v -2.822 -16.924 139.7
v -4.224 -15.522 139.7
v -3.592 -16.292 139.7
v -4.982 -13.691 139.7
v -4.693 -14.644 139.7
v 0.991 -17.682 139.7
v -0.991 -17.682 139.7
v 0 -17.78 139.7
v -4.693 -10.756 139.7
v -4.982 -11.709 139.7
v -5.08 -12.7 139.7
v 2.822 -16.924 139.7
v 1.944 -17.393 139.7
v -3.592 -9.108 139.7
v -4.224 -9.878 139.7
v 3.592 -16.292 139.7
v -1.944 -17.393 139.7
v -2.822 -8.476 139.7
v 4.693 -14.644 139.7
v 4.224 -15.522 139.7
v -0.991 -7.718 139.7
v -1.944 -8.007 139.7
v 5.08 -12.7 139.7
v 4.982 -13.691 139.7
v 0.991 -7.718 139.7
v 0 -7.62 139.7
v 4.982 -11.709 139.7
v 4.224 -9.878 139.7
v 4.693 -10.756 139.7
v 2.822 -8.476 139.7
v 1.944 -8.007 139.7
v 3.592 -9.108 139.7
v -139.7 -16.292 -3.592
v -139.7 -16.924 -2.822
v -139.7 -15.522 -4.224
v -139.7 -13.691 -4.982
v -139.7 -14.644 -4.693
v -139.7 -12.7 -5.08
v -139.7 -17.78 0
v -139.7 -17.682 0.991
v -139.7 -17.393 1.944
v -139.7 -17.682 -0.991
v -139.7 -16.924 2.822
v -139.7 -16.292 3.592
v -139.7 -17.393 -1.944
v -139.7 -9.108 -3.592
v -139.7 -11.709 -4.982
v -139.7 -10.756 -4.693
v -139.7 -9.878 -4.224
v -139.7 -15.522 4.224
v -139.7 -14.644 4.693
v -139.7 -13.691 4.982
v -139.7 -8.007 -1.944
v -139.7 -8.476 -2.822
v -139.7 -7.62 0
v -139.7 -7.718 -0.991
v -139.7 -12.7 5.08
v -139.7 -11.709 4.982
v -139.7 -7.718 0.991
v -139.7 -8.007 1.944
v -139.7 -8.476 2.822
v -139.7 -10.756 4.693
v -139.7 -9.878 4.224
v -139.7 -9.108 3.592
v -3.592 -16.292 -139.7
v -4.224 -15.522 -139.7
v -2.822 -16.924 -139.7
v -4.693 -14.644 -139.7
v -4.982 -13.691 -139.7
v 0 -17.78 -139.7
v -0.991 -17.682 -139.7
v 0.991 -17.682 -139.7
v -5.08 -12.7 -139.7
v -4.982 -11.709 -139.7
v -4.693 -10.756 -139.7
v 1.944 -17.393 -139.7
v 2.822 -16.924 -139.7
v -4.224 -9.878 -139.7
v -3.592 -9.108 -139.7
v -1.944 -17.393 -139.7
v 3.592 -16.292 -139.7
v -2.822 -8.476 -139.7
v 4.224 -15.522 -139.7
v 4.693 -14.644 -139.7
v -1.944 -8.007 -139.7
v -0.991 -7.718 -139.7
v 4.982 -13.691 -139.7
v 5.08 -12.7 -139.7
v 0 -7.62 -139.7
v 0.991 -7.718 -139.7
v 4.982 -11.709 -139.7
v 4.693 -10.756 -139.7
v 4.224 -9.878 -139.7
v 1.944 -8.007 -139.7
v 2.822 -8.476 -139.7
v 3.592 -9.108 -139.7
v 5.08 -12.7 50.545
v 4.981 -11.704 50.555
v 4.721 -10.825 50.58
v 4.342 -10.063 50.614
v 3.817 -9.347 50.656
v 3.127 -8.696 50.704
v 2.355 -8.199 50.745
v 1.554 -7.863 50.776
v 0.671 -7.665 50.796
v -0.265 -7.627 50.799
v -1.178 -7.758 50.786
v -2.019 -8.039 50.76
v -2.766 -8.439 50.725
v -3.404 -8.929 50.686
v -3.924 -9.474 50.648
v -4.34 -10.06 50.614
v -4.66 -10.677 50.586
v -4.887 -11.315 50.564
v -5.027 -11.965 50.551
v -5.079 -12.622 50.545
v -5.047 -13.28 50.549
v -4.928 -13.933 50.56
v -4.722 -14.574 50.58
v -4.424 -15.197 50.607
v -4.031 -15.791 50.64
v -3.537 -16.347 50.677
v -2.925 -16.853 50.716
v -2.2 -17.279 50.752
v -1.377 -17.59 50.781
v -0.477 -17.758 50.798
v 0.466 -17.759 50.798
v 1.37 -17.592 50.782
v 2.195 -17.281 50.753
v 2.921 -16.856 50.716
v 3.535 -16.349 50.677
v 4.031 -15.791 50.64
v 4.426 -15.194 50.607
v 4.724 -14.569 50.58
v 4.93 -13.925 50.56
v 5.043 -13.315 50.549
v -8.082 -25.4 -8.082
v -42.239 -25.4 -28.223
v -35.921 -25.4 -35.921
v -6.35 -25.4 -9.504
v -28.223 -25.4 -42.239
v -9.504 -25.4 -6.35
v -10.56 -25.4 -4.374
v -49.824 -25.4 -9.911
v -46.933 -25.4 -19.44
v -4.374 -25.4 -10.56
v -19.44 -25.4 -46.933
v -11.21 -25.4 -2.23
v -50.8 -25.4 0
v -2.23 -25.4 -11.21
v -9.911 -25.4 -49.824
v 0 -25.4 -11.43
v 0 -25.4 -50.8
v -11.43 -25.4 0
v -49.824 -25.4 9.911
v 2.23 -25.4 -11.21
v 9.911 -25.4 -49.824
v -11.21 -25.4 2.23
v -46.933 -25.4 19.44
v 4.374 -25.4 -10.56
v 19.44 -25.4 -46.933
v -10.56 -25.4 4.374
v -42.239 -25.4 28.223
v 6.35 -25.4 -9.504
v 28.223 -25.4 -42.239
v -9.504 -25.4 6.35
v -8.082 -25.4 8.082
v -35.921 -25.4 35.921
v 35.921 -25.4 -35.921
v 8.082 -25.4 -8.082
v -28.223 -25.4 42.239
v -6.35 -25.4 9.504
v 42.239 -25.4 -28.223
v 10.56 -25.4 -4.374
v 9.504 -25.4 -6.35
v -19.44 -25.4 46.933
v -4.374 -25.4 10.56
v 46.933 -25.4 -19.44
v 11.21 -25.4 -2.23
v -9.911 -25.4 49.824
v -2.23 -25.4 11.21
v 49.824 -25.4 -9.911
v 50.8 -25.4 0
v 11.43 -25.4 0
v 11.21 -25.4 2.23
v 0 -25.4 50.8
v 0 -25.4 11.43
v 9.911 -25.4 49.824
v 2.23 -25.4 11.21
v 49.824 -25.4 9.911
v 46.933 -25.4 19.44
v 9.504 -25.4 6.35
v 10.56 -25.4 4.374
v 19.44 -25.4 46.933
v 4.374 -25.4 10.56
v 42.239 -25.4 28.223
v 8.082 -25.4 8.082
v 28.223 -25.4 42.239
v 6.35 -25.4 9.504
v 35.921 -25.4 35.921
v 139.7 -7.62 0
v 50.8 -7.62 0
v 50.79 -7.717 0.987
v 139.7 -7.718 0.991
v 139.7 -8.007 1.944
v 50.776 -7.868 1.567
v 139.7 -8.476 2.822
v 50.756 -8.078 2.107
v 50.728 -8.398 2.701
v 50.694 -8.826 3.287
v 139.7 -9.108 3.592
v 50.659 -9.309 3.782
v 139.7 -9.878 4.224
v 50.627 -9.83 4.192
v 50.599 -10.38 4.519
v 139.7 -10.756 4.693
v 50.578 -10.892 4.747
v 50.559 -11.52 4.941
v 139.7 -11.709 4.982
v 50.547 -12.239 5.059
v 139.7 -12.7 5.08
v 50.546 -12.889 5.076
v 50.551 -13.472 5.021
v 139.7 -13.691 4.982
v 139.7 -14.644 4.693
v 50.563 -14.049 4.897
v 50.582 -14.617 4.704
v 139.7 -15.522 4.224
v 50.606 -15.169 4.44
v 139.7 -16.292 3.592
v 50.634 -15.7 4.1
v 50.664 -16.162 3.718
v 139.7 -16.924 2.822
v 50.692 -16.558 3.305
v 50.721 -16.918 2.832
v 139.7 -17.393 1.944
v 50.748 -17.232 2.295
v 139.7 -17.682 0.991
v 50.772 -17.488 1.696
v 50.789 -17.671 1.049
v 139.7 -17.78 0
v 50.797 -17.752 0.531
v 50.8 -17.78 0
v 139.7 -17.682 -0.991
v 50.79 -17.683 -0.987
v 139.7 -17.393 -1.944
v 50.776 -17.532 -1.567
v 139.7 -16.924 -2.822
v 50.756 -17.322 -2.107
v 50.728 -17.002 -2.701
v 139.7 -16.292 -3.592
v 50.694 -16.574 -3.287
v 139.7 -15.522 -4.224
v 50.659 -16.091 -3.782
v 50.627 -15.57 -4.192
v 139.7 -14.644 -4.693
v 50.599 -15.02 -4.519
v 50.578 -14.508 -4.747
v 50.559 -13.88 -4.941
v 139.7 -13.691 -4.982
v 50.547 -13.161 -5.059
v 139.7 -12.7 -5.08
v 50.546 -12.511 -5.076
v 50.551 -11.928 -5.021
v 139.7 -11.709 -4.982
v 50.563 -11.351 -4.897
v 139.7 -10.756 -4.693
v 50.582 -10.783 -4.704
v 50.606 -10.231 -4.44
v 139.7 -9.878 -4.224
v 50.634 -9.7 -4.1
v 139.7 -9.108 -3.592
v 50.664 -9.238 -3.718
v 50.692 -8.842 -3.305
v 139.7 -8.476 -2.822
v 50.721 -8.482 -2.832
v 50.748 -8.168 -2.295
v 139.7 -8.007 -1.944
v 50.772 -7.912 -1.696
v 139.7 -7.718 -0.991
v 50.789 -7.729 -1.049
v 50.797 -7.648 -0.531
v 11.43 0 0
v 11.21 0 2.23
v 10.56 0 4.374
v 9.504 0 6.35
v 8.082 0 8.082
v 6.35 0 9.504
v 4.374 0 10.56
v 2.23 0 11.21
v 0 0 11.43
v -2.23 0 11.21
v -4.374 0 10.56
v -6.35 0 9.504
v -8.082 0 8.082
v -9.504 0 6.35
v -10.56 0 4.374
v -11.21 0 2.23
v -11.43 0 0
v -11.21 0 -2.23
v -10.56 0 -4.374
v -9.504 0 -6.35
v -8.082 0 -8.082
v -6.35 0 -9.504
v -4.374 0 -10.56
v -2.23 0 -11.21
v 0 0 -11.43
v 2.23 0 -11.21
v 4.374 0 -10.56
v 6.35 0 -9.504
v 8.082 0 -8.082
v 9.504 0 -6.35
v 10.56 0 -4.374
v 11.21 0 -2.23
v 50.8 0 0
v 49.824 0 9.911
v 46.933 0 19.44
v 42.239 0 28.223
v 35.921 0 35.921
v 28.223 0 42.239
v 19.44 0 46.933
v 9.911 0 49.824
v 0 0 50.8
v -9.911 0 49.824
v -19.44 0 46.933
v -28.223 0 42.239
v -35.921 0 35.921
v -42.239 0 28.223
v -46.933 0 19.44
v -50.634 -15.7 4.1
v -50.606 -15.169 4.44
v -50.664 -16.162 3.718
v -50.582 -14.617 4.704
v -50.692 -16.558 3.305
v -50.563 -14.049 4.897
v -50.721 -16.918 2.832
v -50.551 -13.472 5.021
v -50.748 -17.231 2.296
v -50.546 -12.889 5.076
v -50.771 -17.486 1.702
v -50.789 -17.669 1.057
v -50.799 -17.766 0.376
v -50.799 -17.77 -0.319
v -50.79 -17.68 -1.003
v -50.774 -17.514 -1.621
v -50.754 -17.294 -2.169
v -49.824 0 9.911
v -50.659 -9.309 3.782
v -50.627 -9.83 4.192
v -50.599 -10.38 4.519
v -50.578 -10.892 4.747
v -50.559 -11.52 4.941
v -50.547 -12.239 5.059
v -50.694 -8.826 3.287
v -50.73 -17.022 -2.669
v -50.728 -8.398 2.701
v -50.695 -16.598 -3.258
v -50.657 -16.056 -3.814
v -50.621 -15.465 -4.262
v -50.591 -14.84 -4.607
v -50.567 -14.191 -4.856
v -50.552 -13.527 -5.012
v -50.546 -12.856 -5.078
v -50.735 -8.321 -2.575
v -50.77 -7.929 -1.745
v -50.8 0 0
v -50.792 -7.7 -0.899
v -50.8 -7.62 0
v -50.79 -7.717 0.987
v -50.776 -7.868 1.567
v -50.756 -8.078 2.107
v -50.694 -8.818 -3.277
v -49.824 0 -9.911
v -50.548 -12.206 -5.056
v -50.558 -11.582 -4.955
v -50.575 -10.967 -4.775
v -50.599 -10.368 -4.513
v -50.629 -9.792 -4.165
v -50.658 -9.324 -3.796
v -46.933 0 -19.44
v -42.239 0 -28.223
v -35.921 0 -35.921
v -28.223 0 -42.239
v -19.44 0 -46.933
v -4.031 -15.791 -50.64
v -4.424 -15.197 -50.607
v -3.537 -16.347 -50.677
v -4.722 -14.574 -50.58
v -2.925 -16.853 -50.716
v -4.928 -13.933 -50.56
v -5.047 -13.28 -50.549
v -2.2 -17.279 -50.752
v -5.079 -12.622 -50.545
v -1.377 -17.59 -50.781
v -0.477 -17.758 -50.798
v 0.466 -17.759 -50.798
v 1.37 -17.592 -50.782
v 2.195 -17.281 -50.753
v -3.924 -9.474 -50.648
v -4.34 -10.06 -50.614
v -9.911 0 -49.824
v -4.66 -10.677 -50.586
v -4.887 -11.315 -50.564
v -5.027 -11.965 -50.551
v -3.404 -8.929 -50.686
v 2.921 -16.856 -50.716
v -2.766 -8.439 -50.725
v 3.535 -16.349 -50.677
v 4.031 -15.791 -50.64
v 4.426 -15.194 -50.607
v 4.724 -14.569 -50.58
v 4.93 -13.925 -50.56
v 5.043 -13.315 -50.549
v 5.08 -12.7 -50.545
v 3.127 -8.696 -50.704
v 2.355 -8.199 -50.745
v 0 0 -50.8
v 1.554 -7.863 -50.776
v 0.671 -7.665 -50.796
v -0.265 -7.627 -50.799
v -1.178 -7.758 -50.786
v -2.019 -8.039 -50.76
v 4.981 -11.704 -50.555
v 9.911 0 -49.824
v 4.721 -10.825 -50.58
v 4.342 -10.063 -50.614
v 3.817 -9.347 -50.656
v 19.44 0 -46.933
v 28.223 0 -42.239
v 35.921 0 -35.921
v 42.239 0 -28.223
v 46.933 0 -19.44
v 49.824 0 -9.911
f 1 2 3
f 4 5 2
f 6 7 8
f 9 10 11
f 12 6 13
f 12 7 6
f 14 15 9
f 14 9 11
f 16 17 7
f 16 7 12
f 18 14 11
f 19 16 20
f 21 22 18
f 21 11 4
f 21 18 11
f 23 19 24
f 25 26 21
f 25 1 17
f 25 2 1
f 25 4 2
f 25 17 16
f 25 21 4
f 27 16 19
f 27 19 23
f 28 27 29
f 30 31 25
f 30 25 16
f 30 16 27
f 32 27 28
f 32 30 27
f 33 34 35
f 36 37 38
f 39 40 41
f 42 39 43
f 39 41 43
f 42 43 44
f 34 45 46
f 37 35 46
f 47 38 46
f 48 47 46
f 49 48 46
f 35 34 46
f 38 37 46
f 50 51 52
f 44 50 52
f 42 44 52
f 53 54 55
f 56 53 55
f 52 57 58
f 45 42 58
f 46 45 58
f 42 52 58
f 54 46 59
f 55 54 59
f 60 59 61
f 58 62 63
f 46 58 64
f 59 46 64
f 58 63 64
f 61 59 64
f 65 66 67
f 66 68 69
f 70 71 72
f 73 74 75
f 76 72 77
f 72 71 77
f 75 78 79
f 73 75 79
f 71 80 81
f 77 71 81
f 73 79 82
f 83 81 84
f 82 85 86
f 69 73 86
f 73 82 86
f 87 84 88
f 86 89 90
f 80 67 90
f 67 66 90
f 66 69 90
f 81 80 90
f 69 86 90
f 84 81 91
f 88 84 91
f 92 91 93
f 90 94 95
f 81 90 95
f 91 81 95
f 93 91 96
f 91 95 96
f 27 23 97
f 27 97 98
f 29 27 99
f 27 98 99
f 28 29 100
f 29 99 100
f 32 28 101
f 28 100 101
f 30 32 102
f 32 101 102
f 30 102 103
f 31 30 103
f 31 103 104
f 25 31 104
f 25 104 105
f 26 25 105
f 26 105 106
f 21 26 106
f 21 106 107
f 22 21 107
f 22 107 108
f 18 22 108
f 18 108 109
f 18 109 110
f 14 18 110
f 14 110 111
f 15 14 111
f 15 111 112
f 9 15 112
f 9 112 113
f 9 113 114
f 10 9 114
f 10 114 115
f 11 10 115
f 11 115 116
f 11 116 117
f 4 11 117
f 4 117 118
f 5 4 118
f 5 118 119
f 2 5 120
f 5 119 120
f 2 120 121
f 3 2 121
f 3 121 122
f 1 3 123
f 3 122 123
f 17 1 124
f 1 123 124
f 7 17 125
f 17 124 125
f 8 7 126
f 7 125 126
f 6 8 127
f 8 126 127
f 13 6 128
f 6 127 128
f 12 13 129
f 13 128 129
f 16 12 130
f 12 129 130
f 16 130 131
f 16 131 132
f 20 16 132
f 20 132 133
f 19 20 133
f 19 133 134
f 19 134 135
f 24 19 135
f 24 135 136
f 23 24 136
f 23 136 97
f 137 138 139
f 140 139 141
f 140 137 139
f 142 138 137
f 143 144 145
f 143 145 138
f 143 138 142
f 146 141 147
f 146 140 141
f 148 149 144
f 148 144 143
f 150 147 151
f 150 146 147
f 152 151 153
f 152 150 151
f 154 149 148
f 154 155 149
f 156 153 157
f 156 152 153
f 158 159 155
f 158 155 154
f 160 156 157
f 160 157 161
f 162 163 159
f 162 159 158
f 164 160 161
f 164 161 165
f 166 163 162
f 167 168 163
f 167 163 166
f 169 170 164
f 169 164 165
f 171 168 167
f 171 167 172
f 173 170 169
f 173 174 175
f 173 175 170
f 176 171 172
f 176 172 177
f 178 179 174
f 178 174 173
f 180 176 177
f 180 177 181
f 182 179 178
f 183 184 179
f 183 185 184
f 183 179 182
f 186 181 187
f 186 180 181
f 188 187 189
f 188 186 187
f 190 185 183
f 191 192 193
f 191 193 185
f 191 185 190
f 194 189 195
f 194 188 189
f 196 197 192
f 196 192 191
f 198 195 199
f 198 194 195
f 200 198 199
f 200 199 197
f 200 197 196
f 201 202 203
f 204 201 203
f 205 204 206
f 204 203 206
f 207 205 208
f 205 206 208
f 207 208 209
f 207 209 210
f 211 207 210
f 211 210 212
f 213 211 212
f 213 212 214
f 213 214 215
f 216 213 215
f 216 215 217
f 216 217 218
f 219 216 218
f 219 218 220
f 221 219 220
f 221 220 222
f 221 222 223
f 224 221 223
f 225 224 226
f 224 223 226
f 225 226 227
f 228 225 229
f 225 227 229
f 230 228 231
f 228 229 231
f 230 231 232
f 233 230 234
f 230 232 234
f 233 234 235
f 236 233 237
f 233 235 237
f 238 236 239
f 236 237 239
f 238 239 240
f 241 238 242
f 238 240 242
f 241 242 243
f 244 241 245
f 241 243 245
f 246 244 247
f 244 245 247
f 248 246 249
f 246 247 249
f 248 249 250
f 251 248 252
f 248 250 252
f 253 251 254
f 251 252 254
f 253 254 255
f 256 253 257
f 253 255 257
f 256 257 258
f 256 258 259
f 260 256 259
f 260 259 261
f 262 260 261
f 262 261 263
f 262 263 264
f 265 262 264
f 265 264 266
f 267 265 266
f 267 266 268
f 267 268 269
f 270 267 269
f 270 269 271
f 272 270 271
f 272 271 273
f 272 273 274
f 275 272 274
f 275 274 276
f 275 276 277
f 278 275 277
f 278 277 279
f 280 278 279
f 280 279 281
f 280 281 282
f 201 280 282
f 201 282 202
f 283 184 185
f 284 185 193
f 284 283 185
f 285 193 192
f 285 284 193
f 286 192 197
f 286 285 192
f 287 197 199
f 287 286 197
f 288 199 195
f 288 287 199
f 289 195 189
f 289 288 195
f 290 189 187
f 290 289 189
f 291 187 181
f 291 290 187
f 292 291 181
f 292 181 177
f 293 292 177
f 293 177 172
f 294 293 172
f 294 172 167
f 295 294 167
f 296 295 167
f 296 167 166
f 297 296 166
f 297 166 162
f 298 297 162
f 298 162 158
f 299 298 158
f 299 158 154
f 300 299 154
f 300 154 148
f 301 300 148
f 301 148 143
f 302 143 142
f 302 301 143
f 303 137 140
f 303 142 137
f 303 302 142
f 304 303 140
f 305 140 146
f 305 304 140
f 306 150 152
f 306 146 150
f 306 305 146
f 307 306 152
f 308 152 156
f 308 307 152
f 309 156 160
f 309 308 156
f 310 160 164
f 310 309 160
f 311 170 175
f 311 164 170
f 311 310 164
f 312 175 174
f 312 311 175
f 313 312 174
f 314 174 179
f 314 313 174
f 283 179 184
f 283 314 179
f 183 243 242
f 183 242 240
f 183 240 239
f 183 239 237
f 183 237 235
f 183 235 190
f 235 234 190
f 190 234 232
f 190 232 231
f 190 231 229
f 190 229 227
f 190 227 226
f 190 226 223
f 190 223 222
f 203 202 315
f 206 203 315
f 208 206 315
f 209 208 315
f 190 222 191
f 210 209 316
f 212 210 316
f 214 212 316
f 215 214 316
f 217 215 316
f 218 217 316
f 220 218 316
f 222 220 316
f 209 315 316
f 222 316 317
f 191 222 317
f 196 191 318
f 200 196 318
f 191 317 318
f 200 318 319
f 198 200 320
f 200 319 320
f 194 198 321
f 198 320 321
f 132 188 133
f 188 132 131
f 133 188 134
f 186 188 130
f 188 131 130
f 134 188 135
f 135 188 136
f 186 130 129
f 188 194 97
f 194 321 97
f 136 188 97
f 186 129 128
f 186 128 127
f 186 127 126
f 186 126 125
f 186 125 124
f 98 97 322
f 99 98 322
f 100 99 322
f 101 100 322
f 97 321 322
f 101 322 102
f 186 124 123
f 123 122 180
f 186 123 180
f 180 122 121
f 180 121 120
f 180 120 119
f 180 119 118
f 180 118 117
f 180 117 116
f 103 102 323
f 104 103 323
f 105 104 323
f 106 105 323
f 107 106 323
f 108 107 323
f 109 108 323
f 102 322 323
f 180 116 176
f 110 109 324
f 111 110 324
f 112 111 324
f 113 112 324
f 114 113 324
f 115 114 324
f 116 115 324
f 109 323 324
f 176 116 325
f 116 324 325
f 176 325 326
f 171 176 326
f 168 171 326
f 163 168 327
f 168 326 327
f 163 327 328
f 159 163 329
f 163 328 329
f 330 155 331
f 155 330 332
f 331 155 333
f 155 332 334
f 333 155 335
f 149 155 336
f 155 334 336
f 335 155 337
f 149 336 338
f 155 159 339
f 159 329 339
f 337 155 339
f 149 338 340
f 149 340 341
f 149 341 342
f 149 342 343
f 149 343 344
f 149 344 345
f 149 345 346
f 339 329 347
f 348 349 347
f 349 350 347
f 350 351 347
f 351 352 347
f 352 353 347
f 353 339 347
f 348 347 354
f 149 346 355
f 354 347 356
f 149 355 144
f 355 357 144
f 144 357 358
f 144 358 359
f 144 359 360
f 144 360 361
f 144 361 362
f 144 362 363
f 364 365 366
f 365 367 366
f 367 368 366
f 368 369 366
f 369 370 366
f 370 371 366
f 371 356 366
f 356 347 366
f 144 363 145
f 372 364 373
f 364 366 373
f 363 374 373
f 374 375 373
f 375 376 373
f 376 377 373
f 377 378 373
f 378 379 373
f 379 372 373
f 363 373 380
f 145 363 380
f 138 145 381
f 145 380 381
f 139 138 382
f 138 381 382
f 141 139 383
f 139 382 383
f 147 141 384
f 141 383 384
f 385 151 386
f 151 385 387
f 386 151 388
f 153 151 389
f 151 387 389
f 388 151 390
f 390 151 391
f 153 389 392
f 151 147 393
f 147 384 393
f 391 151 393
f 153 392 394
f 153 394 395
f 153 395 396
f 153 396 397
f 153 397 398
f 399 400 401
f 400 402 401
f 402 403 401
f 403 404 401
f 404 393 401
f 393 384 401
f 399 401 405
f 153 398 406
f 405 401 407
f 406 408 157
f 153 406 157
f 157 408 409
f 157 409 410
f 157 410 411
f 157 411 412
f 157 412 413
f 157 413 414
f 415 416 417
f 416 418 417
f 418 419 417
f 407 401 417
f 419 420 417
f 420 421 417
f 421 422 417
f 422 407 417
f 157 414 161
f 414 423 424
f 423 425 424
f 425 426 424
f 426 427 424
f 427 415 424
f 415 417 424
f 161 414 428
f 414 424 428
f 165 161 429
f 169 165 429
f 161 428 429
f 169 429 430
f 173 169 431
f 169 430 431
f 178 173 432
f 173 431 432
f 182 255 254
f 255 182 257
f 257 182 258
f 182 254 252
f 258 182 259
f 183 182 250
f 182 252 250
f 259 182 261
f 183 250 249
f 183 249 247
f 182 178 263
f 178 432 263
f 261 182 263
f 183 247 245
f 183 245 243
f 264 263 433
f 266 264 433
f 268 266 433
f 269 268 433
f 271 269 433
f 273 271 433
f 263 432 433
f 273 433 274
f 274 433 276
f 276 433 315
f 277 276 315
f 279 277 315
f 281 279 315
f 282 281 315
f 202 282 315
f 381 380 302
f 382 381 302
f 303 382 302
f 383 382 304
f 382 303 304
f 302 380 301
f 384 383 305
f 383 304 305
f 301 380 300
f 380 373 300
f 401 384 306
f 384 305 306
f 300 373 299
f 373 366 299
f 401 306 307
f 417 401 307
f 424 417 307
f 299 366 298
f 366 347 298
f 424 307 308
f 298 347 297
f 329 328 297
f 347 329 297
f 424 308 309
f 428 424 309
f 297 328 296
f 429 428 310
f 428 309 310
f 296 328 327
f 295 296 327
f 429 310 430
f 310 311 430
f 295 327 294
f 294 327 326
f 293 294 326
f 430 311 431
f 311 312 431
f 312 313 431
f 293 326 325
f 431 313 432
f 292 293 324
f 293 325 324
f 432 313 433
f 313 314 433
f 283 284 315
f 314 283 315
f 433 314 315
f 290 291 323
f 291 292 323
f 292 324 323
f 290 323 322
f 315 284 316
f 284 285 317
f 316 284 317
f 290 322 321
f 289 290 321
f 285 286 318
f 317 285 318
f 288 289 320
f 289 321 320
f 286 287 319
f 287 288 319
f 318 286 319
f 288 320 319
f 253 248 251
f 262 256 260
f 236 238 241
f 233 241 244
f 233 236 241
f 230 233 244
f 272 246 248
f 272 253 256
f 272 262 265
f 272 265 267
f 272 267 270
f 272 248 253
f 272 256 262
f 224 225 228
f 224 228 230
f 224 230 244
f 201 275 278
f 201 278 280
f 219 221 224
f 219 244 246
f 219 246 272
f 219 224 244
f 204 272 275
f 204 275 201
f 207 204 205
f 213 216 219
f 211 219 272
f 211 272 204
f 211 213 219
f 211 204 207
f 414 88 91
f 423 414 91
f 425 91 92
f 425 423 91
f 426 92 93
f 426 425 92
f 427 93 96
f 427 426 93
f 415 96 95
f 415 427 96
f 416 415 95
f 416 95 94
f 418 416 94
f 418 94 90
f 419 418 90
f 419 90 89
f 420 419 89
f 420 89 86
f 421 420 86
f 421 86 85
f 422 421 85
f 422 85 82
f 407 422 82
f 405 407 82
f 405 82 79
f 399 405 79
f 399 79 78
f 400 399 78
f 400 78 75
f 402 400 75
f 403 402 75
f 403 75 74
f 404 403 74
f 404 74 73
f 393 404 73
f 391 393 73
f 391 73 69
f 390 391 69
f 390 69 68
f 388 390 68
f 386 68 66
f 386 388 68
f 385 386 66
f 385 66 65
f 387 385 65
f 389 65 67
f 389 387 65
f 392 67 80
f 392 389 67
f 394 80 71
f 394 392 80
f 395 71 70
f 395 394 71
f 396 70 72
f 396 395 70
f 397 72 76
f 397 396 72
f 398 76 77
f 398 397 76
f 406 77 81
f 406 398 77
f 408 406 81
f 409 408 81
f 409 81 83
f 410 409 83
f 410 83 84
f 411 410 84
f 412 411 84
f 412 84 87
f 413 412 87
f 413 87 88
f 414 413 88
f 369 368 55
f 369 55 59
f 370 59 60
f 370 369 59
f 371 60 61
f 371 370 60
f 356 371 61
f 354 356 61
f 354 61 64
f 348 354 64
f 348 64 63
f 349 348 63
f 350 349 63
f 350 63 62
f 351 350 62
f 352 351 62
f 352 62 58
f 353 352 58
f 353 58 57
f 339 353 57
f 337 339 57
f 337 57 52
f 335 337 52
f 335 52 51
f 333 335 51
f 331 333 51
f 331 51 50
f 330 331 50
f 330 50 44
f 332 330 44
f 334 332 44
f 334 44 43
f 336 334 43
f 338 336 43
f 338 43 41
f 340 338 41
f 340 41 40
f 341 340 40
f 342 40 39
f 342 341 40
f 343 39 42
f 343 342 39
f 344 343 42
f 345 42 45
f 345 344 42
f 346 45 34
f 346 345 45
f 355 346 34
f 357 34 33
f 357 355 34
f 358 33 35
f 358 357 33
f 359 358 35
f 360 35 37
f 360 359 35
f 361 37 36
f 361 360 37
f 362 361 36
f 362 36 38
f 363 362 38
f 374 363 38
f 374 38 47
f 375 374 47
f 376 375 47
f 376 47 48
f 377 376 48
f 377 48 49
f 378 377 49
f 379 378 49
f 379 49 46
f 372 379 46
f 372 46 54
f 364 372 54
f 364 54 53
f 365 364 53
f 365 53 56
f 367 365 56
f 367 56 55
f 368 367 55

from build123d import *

# Parameters (mm, degrees)
F0_R          = 50.8
F1_DEPTH      = 25.4
F2_R          = 5.08
F3_DEPTH      = 139.7
F3_DEPTH_BACK = 139.7
F4_R          = 5.08
F5_DEPTH      = 139.7
F5_DEPTH_BACK = 139.7
F6_R          = 11.43
F7_DEPTH      = 27.94


with BuildPart() as f1:
    # F0 (on Front) → F1 (new body)
    with BuildSketch(Plane.XZ):
        Circle(F0_R)
    extrude(amount=F1_DEPTH)

    # F2 (on Right) → F3 (join, two sides)
    with BuildSketch(Plane.YZ) as f3_sk:
        with Locations((-12.7, 0)):
            Circle(F2_R)
    extrude(amount=F3_DEPTH)
    extrude(f3_sk.sketch, amount=-F3_DEPTH_BACK)

    # F4 (on Top) → F5 (join, two sides)
    with BuildSketch(Plane.XY) as f5_sk:
        with Locations((0, -12.7)):
            Circle(F4_R)
    extrude(amount=F5_DEPTH)
    extrude(f5_sk.sketch, amount=-F5_DEPTH_BACK)

    # F6 (on Front) → F7 (cut)
    with BuildSketch(Plane.XZ):
        Circle(F6_R)
    extrude(amount=F7_DEPTH, mode=Mode.SUBTRACT)


solid = f1.part
